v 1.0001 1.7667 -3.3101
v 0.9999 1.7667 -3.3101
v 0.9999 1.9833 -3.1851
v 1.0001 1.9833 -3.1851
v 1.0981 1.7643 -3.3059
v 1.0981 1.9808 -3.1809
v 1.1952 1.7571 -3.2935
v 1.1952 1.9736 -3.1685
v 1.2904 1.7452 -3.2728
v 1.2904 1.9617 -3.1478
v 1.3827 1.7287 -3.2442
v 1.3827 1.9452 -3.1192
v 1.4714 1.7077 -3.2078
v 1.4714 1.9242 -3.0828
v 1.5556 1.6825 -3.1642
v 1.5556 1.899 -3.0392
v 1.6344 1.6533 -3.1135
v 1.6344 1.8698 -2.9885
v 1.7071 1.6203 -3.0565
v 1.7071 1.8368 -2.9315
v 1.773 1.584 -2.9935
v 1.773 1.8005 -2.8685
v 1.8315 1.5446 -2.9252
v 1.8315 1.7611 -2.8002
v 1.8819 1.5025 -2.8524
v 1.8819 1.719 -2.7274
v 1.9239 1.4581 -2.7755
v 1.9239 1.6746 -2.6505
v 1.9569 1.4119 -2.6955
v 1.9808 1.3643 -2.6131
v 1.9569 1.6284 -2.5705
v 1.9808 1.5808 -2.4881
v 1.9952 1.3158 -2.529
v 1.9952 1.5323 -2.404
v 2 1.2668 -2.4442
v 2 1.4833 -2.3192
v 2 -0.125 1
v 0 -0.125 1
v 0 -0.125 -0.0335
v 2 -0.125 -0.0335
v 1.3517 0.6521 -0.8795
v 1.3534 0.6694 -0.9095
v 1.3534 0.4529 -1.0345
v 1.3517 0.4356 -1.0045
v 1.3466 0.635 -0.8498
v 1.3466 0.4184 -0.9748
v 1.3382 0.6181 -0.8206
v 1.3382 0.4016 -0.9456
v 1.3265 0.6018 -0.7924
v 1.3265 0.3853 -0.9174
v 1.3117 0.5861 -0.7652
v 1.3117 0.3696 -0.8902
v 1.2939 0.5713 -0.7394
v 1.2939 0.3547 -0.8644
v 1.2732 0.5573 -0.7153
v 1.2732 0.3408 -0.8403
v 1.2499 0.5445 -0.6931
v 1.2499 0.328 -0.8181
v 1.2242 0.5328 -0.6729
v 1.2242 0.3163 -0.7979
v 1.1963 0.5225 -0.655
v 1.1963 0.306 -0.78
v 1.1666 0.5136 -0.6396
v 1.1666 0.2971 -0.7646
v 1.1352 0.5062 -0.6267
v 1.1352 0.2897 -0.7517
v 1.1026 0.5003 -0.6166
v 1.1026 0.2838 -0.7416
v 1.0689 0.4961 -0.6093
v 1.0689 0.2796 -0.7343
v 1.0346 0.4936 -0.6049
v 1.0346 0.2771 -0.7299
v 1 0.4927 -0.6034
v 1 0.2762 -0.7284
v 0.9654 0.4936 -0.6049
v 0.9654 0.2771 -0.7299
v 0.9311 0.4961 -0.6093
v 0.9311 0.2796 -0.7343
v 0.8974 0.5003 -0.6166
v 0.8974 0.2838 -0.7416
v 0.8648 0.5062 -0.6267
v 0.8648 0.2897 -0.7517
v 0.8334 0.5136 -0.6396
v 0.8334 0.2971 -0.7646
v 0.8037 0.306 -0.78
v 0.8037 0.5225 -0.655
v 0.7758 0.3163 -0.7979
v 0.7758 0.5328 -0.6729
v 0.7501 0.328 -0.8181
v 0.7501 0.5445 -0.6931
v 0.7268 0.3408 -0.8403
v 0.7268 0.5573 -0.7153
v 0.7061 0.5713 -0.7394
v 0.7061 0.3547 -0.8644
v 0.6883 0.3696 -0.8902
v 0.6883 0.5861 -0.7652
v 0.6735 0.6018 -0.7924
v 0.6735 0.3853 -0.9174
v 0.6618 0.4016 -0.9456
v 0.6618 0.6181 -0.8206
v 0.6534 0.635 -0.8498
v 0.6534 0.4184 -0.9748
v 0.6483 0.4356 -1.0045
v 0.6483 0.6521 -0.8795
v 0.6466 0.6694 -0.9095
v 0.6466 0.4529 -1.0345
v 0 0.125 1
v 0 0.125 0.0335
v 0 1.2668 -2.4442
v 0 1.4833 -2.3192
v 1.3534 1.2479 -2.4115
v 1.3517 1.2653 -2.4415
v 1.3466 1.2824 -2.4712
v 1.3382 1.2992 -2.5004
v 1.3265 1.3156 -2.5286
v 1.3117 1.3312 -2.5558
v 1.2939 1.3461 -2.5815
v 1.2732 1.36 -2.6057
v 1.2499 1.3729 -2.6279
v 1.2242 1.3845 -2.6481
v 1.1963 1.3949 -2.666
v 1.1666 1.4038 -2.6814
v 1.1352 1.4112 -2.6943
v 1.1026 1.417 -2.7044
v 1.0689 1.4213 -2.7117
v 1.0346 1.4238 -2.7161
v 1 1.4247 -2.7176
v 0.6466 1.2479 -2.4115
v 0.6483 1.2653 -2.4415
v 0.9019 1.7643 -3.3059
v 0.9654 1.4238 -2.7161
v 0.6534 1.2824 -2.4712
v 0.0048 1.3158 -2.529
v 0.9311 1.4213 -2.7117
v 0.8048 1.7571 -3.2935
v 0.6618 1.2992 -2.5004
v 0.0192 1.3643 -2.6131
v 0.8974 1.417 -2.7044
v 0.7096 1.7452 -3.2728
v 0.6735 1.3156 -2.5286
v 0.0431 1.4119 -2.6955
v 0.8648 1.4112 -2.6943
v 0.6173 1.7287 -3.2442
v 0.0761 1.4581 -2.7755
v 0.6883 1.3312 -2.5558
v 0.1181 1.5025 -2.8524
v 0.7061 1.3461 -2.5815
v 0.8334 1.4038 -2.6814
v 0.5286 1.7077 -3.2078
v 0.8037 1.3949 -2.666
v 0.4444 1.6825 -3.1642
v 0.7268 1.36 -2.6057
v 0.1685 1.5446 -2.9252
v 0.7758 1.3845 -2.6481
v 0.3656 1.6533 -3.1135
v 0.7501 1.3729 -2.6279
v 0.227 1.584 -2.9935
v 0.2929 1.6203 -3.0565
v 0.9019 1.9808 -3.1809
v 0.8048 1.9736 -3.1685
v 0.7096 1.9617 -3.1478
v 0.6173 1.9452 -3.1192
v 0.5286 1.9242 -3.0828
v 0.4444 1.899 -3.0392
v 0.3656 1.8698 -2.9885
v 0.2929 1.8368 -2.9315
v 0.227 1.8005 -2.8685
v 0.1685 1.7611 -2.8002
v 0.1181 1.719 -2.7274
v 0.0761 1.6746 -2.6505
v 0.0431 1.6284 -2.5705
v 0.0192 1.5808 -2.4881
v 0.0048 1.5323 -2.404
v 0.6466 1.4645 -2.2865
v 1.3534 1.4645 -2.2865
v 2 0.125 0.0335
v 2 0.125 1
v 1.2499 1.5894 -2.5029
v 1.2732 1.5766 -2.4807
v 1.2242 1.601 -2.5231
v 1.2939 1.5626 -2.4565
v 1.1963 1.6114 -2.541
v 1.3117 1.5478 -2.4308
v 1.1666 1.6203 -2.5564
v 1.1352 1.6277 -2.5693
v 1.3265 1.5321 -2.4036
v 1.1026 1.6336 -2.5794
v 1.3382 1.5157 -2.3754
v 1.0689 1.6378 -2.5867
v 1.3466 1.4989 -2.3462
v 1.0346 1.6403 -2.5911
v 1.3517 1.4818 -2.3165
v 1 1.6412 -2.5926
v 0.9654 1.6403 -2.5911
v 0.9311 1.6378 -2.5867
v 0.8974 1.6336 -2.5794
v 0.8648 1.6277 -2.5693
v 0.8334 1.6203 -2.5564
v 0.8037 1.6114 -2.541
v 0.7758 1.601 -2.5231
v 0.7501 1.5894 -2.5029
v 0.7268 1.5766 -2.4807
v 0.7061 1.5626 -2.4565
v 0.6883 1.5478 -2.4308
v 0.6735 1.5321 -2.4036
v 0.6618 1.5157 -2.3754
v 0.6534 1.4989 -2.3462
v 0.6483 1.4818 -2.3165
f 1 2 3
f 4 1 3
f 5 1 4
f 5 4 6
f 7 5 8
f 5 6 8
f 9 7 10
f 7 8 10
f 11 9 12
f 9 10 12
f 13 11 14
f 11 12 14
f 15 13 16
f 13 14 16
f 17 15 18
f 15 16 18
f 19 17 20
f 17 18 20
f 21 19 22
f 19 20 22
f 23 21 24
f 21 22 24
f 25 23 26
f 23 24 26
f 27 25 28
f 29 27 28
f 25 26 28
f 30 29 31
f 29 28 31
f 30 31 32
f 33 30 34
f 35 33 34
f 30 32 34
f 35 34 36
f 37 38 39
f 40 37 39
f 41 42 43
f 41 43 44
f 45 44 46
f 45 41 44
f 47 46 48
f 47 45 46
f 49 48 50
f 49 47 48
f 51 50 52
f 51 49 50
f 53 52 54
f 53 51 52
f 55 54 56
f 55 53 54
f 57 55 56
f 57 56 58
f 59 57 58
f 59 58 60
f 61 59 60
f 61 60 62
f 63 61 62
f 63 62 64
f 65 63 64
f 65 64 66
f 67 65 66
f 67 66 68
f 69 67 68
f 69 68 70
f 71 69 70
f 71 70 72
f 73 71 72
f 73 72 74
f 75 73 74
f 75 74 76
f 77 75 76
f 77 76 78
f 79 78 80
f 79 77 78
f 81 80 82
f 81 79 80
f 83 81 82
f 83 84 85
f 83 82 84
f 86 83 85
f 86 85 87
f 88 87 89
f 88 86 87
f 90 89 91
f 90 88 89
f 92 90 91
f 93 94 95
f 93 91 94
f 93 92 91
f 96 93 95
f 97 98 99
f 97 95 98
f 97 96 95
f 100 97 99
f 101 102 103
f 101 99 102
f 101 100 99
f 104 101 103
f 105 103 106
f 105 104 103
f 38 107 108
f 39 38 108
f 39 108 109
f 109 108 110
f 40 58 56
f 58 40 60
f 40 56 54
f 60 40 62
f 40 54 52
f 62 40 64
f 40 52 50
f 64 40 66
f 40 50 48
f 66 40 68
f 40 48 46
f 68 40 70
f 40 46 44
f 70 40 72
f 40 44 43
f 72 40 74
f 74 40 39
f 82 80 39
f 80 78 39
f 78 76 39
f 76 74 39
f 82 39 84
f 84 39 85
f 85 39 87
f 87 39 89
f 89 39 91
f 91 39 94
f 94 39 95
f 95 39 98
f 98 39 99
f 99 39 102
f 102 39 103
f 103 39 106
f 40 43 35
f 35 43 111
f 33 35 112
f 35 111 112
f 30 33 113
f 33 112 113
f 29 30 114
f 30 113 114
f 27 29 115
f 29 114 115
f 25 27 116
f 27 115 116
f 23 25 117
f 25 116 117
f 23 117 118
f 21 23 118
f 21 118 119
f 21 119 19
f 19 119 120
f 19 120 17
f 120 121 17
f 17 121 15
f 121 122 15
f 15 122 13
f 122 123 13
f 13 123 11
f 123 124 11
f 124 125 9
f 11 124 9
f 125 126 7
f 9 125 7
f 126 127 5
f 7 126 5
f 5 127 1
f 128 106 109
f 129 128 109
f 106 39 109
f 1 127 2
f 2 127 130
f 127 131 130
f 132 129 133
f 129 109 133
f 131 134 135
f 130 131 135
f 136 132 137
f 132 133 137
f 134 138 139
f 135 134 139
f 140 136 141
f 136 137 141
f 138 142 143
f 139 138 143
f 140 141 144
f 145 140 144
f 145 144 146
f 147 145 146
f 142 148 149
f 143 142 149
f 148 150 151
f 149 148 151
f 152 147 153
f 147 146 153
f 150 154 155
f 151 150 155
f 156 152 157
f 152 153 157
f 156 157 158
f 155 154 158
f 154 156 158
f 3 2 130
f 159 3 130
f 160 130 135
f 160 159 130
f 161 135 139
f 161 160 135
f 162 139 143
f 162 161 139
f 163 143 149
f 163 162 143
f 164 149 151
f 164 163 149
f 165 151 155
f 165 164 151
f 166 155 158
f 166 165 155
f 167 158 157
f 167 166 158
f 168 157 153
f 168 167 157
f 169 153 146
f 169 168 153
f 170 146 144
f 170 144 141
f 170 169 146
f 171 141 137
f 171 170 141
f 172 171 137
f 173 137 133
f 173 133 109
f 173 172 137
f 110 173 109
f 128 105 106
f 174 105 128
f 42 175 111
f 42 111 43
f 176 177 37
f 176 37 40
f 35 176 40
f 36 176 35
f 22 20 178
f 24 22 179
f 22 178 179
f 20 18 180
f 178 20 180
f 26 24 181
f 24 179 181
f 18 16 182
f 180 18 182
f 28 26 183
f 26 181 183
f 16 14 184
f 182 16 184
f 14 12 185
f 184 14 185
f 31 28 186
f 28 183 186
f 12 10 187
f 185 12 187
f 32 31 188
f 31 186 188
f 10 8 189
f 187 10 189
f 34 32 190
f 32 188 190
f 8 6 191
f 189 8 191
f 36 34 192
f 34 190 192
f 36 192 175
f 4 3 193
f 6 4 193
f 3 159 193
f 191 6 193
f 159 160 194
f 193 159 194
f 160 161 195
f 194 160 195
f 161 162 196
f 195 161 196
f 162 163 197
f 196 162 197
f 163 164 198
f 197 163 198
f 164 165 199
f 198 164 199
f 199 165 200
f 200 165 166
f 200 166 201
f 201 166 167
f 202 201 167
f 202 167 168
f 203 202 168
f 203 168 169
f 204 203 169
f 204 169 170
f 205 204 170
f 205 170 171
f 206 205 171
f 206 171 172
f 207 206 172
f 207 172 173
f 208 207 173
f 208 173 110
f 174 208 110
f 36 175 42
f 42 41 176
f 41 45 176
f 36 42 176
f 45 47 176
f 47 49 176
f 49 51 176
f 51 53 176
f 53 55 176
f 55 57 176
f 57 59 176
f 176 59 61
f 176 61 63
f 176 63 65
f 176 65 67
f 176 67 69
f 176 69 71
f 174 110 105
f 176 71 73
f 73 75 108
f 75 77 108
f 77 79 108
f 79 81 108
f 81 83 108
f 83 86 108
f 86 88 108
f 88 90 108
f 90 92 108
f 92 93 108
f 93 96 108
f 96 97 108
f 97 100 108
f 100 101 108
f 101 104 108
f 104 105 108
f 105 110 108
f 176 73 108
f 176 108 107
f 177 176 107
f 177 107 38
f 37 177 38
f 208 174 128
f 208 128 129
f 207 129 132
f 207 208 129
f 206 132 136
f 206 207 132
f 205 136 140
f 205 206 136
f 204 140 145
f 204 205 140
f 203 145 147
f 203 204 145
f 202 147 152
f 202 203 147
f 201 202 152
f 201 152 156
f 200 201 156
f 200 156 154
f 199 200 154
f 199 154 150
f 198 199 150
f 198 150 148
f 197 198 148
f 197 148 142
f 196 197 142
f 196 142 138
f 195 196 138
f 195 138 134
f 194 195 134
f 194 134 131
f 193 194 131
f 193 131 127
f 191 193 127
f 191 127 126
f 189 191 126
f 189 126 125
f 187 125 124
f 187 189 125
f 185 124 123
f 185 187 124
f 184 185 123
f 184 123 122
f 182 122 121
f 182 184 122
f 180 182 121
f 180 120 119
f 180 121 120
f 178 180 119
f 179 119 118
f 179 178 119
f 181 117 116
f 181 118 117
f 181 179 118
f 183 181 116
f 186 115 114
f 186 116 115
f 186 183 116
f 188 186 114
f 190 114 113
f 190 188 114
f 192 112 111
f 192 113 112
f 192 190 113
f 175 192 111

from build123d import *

# Parameters (mm, degrees)
SALIENTE_EXTRUIR3_DEPTH = 2
REDONDEO2_R             = 1
CORTAR_EXTRUIR1_REACH   = 6.346


with BuildPart() as part:
    # Croquis9 → Saliente-Extruir3 (new body)
    with BuildSketch(Plane(origin=(0, 0, 0), x_dir=(0, 0, -1), z_dir=(1, 0, 0))):
        Polygon((3.310095264, 1.766746825), (3.185095264, 1.983253175), (-0.033493649, 0.125), (-1, 0.125), (-1, -0.125), (0.033493649, -0.125), align=None)
    extrude(amount=SALIENTE_EXTRUIR3_DEPTH)

    # Redondeo2
    redondeo2_edges = [part.edges().sort_by_distance(p)[0] for p in [
        (0, 1.875, -3.247595264),
        (2, 1.875, -3.247595264),
    ]]
    fillet(redondeo2_edges, radius=REDONDEO2_R - 0.0001)  # a hair under: the kernel refuses the full size

    # Croquis10 → Cortar-Extruir1 (cut, up to next)
    with BuildSketch(Plane(origin=(0, 0.108253175, 0.0625), x_dir=(1, 0, 0), z_dir=(0, 0.8660254037844386, 0.4999999999999999)), mode=Mode.PRIVATE) as cortar_extruir1_sk1:
        with BuildLine():
            Line((0.646584864, 1.122348106), (0.646584864, 2.712399563))
            ThreePointArc((0.646584864, 2.712399563), (1, 3.065814699), (1.353415136, 2.712399563))
            Line((1.353415136, 2.712399563), (1.353415136, 1.122348106))
            ThreePointArc((1.353415136, 1.122348106), (1, 0.76893297), (0.646584864, 1.122348106))
        make_face()
    cortar_extruir1_tool1 = extrude(cortar_extruir1_sk1.sketch, amount=-CORTAR_EXTRUIR1_REACH, mode=Mode.PRIVATE) & part.part
    add(cortar_extruir1_tool1.solids().sort_by_distance((1, 1.06694, -1.597994))[0], mode=Mode.SUBTRACT)


solid = part.part
